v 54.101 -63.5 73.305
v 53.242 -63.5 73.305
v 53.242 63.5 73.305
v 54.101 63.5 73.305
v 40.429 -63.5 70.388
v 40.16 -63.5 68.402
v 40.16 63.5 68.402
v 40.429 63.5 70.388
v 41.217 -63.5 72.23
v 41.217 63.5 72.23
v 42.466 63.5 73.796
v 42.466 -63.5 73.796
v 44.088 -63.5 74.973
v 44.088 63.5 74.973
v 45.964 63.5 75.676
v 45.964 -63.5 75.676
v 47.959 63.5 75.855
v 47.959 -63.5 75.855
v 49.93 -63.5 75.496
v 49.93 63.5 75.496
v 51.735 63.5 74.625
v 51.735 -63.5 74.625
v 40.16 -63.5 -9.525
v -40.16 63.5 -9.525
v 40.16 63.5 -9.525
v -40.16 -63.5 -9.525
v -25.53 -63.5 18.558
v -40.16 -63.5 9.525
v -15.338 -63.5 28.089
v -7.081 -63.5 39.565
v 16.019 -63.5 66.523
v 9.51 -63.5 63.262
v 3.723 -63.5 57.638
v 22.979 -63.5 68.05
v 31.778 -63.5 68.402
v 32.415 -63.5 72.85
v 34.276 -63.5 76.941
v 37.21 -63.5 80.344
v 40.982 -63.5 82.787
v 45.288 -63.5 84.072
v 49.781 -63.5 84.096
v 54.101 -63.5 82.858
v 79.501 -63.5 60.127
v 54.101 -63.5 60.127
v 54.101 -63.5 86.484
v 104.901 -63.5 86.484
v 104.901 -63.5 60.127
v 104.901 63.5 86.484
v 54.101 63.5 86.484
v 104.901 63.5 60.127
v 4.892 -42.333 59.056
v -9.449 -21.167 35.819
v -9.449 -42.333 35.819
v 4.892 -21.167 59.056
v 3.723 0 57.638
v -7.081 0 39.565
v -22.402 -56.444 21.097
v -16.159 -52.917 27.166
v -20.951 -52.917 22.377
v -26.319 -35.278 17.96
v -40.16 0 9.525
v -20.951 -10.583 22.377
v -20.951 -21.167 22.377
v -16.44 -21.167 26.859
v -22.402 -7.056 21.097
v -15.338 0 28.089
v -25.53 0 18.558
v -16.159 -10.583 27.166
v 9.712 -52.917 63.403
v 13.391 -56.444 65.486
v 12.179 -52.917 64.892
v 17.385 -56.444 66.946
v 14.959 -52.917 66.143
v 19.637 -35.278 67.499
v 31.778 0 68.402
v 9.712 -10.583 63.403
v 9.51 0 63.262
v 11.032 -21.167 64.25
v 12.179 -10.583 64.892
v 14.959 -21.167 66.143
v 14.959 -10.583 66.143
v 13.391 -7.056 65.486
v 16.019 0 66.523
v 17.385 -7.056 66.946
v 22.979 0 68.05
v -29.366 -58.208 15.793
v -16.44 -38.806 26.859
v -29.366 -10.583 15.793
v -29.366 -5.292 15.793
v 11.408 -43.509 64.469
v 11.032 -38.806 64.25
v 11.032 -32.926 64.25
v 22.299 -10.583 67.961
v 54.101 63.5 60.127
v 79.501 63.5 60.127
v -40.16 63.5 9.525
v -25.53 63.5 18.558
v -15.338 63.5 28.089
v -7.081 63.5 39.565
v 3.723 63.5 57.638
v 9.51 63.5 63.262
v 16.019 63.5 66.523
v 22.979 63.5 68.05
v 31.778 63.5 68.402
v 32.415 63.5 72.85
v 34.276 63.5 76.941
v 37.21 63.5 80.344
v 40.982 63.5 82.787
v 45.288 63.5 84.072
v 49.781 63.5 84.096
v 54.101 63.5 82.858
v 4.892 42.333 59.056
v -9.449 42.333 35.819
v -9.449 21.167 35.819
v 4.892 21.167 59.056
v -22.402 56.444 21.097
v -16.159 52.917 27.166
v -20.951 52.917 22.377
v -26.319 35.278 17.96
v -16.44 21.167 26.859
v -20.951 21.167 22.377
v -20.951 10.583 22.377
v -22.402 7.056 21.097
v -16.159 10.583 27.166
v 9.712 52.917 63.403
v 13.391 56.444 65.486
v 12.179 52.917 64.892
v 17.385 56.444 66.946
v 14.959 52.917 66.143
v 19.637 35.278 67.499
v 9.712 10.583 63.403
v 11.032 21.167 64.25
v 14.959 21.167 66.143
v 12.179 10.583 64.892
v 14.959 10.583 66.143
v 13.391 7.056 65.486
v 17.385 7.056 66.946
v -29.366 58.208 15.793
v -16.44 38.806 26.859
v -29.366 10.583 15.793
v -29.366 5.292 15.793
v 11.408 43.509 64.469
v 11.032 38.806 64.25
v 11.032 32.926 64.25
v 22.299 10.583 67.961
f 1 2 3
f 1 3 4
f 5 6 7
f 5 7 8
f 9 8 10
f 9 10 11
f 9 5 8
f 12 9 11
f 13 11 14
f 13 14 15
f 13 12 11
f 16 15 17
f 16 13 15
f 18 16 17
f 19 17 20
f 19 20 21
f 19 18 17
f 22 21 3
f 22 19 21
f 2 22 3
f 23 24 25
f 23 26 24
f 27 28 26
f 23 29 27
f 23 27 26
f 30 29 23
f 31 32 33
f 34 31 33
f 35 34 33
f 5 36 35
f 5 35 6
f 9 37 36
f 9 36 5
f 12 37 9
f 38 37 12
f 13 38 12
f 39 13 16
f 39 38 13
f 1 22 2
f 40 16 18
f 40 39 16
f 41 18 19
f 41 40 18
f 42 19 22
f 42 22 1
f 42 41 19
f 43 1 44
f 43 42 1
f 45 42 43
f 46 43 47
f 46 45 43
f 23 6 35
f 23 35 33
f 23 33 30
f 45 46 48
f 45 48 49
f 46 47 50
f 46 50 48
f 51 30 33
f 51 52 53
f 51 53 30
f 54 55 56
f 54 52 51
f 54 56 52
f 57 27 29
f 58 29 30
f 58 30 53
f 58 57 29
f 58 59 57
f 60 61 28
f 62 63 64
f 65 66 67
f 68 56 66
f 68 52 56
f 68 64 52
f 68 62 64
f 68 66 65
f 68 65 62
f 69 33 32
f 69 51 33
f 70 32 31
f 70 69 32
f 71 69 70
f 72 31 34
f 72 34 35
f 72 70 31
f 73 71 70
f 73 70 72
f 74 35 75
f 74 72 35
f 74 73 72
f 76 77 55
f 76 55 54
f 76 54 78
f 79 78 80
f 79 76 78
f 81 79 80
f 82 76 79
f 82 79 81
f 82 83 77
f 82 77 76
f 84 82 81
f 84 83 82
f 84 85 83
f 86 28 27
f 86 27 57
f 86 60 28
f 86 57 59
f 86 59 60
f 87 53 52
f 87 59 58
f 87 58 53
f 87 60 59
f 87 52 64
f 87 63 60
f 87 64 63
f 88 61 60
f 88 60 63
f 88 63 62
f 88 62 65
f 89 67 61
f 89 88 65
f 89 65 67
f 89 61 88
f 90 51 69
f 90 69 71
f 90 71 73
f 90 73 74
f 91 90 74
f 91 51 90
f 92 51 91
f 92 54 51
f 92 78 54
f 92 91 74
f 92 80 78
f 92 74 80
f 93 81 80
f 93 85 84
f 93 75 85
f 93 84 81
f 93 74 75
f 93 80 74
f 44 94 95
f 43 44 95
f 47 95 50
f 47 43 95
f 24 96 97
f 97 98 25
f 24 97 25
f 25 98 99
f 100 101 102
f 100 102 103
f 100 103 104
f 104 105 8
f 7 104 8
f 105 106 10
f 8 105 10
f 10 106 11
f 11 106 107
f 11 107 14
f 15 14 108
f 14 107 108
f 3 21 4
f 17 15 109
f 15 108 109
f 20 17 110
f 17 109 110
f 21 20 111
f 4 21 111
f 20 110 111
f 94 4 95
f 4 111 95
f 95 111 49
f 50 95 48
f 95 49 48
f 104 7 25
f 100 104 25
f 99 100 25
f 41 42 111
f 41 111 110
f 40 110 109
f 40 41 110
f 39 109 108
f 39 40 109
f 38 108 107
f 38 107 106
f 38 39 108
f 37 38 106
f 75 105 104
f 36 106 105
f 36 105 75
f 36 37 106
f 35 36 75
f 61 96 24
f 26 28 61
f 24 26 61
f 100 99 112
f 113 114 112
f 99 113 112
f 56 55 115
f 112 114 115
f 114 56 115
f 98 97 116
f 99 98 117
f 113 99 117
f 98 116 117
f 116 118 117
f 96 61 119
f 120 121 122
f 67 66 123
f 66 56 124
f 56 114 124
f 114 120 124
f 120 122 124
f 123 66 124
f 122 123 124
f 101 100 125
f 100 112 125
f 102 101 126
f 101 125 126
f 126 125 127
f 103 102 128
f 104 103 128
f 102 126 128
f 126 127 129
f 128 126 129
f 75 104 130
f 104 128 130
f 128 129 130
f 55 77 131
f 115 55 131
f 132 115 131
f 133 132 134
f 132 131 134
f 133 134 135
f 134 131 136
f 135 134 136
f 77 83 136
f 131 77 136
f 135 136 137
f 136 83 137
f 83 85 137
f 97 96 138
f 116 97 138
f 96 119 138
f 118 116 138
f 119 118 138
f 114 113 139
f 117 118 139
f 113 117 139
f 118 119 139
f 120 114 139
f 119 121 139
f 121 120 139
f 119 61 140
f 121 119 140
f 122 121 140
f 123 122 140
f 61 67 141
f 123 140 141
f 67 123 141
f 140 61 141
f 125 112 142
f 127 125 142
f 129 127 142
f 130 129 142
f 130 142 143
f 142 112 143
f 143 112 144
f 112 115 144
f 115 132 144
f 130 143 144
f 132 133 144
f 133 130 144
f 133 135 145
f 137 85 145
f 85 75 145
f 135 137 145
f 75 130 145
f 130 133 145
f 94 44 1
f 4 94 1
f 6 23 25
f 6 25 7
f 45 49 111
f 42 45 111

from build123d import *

# Parameters (mm, degrees)
F0_W     = 25.4
F0_H     = 13.1786093116
F1_DEPTH = 63.5


with BuildPart() as f1:
    # F0 (on Front) → F1 (new body, symmetric)
    with BuildSketch(Plane.XZ):
        Polygon((-40.1599369943, -9.525), (40.1599369943, -9.525), (40.1599369943, 9.525), (31.7779369652, 9.525), (-40.1599369943, 9.525), align=None)
        with BuildLine():
            Line((31.7779369652, 9.525), (40.1599369943, 9.525))
            Line((40.1599369943, 9.525), (40.1599369943, 68.4023214343))
            ThreePointArc((40.1599369943, 68.4023214343), (45.0018921637, 75.3878619554), (53.2423900817, 73.3054354144))
            Line((53.2423900817, 73.3054354144), (54.1008195247, 73.3054354144))
            Line((54.1008195247, 73.3054354144), (54.1008195247, 82.8580701694))
            ThreePointArc((54.1008195247, 82.8580701694), (39.0089250876, 81.6996873131), (31.7779369652, 68.4023214343))
            Line((31.7779369652, 68.4023214343), (31.7779369652, 9.525))
        make_face()
        with BuildLine():
            add(Edge.make_bspline(
                [(-40.1599369943, 9.525), (8.3736795932, 33.7357372046), (-11.0195567831, 69.6132257581), (31.7779369652, 68.4023214343)],
                knots=[0, 0, 0, 0, 92.960188732, 92.960188732, 92.960188732, 92.960188732], degree=3))
            Line((-40.1599369943, 9.525), (31.7779369652, 9.525))
            Line((31.7779369652, 9.525), (31.7779369652, 68.4023214343))
        make_face()
        with BuildLine():
            ThreePointArc((56.2499082782, 81.6874354435), (55.198002297, 82.3143130986), (54.1008195247, 82.8580701694))
            Line((54.1008195247, 82.8580701694), (54.1008195247, 73.3054354144))
            Line((54.1008195247, 73.3054354144), (79.5008195247, 73.3054354144))
            Line((79.5008195247, 73.3054354144), (79.5008195247, 81.6874354435))
            Line((79.5008195247, 81.6874354435), (56.2499082782, 81.6874354435))
        make_face()
        with BuildLine():
            Line((54.1008195247, 86.484044726), (54.1008195247, 82.8580701694))
            ThreePointArc((54.1008195247, 82.8580701694), (55.198002297, 82.3143130986), (56.2499082782, 81.6874354435))
            Line((56.2499082782, 81.6874354435), (79.5008195247, 81.6874354435))
            Line((79.5008195247, 81.6874354435), (79.5008195247, 86.484044726))
            Line((79.5008195247, 86.484044726), (54.1008195247, 86.484044726))
        make_face()
        with Locations((66.8008195247, 66.7161307586)):
            Rectangle(F0_W, F0_H)
        Polygon((79.5008195247, 81.6874354435), (79.5008195247, 73.3054354144), (79.5008195247, 60.1268261029), (104.9008195247, 60.1268261029), (104.9008195247, 86.484044726), (79.5008195247, 86.484044726), align=None)
    extrude(amount=F1_DEPTH, both=True)


solid = f1.part
